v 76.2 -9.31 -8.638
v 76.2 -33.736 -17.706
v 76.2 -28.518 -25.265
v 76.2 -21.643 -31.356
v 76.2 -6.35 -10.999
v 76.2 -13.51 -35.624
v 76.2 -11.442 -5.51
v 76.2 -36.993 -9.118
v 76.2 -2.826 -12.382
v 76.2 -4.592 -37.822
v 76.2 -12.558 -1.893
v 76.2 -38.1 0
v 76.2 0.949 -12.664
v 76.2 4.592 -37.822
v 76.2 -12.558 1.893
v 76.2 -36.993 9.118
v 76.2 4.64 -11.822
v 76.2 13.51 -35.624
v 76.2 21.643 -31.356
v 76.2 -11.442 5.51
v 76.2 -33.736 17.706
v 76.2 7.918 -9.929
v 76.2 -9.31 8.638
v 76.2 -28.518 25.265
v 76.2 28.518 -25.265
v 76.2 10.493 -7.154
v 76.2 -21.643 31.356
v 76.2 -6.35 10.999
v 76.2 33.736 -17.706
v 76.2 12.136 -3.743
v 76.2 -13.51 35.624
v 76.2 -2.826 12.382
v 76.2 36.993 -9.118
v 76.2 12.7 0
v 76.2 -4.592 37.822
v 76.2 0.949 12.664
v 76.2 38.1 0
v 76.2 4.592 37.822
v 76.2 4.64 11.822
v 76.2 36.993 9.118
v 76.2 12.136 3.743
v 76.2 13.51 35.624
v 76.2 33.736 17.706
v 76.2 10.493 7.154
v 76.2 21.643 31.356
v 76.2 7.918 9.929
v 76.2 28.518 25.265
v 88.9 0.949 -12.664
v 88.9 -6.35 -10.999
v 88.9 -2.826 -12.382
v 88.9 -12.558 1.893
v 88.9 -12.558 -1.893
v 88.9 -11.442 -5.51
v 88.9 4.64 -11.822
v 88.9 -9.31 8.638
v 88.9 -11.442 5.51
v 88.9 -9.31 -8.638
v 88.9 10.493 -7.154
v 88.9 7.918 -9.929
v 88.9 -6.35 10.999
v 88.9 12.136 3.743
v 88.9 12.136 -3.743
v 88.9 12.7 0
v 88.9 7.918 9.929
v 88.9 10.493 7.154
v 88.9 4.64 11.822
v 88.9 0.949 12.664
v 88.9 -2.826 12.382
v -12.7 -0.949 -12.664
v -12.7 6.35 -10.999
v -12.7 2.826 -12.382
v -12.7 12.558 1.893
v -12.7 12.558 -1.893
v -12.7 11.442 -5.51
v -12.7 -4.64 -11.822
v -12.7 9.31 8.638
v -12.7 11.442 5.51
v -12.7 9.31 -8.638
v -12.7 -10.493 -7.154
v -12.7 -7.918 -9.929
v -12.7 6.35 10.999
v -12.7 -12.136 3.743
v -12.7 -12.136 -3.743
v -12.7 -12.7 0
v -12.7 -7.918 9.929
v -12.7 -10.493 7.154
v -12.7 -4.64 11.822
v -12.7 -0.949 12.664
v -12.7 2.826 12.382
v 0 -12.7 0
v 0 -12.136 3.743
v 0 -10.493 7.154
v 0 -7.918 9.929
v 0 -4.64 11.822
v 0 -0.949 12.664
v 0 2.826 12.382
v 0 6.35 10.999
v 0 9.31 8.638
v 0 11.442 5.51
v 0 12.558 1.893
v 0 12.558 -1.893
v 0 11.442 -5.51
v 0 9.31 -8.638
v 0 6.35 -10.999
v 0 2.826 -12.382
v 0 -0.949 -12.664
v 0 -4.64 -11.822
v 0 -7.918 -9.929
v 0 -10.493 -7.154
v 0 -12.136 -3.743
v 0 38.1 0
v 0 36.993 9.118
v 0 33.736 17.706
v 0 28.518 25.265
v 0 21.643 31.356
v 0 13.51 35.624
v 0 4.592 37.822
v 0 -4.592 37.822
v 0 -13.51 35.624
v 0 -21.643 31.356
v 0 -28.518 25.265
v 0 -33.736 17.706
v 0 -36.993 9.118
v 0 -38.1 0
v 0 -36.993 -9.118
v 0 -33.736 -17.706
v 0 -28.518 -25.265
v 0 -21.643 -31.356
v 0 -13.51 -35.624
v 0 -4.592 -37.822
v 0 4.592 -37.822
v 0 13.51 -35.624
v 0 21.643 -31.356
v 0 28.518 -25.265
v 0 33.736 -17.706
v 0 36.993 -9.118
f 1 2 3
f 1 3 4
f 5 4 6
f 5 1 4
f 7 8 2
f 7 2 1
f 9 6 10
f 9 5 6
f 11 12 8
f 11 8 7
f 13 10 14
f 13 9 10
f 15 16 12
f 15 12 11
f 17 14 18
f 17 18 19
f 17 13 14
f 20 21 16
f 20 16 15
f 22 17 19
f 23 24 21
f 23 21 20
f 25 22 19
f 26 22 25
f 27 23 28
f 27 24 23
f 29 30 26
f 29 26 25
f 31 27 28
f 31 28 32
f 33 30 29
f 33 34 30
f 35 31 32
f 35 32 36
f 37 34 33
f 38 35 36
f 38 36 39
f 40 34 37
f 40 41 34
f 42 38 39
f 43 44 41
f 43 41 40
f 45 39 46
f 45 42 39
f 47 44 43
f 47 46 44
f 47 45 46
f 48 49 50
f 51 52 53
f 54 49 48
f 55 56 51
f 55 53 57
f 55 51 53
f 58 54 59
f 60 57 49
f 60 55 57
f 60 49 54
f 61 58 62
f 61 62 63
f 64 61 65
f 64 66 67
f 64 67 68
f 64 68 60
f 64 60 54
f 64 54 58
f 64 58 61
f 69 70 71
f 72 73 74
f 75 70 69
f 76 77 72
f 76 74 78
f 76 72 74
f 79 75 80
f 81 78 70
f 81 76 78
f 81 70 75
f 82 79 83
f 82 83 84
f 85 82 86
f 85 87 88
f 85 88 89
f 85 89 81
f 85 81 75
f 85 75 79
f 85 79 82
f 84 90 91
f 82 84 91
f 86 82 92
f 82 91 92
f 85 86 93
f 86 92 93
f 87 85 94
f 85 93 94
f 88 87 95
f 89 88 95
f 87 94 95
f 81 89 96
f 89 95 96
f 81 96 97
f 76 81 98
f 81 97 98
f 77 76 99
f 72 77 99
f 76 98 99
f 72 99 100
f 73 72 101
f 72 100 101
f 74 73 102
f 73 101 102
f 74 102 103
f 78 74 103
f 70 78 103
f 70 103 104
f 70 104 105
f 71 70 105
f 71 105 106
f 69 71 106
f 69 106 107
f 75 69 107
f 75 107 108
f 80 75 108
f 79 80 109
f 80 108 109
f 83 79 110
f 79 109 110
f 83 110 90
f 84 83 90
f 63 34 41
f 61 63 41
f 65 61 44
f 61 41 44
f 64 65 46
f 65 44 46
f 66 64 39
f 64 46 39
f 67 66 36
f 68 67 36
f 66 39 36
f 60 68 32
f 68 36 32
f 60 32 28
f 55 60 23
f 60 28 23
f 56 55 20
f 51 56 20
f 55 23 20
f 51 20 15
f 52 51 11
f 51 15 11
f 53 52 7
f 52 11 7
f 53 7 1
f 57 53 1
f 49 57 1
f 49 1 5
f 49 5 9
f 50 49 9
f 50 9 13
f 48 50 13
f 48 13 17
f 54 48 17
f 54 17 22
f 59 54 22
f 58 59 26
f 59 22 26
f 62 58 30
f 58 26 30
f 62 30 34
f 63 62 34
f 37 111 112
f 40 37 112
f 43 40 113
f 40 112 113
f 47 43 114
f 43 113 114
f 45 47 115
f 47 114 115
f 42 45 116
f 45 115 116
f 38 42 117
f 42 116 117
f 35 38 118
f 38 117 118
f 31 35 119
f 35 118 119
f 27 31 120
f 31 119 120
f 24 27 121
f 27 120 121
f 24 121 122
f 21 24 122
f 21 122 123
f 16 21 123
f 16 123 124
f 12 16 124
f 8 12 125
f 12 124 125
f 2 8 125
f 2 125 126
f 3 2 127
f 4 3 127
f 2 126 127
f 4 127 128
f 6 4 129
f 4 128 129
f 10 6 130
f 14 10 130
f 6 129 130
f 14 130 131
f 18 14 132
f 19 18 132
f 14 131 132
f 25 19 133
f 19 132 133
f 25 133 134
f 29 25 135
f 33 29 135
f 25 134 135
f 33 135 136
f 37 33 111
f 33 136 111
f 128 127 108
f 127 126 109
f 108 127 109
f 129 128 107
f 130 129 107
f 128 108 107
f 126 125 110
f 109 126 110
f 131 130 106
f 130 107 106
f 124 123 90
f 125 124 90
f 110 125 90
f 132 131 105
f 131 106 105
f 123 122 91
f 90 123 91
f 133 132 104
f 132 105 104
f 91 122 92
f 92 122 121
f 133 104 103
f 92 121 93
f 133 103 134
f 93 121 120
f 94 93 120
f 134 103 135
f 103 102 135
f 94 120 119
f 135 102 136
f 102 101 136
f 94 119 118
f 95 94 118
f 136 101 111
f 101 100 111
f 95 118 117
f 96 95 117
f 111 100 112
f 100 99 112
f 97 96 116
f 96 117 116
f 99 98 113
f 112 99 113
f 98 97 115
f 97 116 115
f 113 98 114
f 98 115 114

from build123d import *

# Parameters (mm, degrees)
F0_R     = 38.1
F1_DEPTH = 76.2
F2_R     = 12.7
F3_DEPTH = 12.7
F4_R     = 12.7
F5_DEPTH = 12.7


with BuildPart() as f1:
    # F0 (on Right) → F1 (new body)
    with BuildSketch(Plane.YZ):
        Circle(F0_R)
    extrude(amount=F1_DEPTH)

    # F2 (on face) → F3 (join)
    with BuildSketch(Plane(origin=(0, 0, 0), x_dir=(0, -1, 0), z_dir=(-1, 0, 0))):
        Circle(F2_R)
    extrude(amount=F3_DEPTH)

    # F4 (on face) → F5 (join)
    with BuildSketch(Plane.YZ.offset(76.2)):
        Circle(F4_R)
    extrude(amount=F5_DEPTH)


solid = f1.part
